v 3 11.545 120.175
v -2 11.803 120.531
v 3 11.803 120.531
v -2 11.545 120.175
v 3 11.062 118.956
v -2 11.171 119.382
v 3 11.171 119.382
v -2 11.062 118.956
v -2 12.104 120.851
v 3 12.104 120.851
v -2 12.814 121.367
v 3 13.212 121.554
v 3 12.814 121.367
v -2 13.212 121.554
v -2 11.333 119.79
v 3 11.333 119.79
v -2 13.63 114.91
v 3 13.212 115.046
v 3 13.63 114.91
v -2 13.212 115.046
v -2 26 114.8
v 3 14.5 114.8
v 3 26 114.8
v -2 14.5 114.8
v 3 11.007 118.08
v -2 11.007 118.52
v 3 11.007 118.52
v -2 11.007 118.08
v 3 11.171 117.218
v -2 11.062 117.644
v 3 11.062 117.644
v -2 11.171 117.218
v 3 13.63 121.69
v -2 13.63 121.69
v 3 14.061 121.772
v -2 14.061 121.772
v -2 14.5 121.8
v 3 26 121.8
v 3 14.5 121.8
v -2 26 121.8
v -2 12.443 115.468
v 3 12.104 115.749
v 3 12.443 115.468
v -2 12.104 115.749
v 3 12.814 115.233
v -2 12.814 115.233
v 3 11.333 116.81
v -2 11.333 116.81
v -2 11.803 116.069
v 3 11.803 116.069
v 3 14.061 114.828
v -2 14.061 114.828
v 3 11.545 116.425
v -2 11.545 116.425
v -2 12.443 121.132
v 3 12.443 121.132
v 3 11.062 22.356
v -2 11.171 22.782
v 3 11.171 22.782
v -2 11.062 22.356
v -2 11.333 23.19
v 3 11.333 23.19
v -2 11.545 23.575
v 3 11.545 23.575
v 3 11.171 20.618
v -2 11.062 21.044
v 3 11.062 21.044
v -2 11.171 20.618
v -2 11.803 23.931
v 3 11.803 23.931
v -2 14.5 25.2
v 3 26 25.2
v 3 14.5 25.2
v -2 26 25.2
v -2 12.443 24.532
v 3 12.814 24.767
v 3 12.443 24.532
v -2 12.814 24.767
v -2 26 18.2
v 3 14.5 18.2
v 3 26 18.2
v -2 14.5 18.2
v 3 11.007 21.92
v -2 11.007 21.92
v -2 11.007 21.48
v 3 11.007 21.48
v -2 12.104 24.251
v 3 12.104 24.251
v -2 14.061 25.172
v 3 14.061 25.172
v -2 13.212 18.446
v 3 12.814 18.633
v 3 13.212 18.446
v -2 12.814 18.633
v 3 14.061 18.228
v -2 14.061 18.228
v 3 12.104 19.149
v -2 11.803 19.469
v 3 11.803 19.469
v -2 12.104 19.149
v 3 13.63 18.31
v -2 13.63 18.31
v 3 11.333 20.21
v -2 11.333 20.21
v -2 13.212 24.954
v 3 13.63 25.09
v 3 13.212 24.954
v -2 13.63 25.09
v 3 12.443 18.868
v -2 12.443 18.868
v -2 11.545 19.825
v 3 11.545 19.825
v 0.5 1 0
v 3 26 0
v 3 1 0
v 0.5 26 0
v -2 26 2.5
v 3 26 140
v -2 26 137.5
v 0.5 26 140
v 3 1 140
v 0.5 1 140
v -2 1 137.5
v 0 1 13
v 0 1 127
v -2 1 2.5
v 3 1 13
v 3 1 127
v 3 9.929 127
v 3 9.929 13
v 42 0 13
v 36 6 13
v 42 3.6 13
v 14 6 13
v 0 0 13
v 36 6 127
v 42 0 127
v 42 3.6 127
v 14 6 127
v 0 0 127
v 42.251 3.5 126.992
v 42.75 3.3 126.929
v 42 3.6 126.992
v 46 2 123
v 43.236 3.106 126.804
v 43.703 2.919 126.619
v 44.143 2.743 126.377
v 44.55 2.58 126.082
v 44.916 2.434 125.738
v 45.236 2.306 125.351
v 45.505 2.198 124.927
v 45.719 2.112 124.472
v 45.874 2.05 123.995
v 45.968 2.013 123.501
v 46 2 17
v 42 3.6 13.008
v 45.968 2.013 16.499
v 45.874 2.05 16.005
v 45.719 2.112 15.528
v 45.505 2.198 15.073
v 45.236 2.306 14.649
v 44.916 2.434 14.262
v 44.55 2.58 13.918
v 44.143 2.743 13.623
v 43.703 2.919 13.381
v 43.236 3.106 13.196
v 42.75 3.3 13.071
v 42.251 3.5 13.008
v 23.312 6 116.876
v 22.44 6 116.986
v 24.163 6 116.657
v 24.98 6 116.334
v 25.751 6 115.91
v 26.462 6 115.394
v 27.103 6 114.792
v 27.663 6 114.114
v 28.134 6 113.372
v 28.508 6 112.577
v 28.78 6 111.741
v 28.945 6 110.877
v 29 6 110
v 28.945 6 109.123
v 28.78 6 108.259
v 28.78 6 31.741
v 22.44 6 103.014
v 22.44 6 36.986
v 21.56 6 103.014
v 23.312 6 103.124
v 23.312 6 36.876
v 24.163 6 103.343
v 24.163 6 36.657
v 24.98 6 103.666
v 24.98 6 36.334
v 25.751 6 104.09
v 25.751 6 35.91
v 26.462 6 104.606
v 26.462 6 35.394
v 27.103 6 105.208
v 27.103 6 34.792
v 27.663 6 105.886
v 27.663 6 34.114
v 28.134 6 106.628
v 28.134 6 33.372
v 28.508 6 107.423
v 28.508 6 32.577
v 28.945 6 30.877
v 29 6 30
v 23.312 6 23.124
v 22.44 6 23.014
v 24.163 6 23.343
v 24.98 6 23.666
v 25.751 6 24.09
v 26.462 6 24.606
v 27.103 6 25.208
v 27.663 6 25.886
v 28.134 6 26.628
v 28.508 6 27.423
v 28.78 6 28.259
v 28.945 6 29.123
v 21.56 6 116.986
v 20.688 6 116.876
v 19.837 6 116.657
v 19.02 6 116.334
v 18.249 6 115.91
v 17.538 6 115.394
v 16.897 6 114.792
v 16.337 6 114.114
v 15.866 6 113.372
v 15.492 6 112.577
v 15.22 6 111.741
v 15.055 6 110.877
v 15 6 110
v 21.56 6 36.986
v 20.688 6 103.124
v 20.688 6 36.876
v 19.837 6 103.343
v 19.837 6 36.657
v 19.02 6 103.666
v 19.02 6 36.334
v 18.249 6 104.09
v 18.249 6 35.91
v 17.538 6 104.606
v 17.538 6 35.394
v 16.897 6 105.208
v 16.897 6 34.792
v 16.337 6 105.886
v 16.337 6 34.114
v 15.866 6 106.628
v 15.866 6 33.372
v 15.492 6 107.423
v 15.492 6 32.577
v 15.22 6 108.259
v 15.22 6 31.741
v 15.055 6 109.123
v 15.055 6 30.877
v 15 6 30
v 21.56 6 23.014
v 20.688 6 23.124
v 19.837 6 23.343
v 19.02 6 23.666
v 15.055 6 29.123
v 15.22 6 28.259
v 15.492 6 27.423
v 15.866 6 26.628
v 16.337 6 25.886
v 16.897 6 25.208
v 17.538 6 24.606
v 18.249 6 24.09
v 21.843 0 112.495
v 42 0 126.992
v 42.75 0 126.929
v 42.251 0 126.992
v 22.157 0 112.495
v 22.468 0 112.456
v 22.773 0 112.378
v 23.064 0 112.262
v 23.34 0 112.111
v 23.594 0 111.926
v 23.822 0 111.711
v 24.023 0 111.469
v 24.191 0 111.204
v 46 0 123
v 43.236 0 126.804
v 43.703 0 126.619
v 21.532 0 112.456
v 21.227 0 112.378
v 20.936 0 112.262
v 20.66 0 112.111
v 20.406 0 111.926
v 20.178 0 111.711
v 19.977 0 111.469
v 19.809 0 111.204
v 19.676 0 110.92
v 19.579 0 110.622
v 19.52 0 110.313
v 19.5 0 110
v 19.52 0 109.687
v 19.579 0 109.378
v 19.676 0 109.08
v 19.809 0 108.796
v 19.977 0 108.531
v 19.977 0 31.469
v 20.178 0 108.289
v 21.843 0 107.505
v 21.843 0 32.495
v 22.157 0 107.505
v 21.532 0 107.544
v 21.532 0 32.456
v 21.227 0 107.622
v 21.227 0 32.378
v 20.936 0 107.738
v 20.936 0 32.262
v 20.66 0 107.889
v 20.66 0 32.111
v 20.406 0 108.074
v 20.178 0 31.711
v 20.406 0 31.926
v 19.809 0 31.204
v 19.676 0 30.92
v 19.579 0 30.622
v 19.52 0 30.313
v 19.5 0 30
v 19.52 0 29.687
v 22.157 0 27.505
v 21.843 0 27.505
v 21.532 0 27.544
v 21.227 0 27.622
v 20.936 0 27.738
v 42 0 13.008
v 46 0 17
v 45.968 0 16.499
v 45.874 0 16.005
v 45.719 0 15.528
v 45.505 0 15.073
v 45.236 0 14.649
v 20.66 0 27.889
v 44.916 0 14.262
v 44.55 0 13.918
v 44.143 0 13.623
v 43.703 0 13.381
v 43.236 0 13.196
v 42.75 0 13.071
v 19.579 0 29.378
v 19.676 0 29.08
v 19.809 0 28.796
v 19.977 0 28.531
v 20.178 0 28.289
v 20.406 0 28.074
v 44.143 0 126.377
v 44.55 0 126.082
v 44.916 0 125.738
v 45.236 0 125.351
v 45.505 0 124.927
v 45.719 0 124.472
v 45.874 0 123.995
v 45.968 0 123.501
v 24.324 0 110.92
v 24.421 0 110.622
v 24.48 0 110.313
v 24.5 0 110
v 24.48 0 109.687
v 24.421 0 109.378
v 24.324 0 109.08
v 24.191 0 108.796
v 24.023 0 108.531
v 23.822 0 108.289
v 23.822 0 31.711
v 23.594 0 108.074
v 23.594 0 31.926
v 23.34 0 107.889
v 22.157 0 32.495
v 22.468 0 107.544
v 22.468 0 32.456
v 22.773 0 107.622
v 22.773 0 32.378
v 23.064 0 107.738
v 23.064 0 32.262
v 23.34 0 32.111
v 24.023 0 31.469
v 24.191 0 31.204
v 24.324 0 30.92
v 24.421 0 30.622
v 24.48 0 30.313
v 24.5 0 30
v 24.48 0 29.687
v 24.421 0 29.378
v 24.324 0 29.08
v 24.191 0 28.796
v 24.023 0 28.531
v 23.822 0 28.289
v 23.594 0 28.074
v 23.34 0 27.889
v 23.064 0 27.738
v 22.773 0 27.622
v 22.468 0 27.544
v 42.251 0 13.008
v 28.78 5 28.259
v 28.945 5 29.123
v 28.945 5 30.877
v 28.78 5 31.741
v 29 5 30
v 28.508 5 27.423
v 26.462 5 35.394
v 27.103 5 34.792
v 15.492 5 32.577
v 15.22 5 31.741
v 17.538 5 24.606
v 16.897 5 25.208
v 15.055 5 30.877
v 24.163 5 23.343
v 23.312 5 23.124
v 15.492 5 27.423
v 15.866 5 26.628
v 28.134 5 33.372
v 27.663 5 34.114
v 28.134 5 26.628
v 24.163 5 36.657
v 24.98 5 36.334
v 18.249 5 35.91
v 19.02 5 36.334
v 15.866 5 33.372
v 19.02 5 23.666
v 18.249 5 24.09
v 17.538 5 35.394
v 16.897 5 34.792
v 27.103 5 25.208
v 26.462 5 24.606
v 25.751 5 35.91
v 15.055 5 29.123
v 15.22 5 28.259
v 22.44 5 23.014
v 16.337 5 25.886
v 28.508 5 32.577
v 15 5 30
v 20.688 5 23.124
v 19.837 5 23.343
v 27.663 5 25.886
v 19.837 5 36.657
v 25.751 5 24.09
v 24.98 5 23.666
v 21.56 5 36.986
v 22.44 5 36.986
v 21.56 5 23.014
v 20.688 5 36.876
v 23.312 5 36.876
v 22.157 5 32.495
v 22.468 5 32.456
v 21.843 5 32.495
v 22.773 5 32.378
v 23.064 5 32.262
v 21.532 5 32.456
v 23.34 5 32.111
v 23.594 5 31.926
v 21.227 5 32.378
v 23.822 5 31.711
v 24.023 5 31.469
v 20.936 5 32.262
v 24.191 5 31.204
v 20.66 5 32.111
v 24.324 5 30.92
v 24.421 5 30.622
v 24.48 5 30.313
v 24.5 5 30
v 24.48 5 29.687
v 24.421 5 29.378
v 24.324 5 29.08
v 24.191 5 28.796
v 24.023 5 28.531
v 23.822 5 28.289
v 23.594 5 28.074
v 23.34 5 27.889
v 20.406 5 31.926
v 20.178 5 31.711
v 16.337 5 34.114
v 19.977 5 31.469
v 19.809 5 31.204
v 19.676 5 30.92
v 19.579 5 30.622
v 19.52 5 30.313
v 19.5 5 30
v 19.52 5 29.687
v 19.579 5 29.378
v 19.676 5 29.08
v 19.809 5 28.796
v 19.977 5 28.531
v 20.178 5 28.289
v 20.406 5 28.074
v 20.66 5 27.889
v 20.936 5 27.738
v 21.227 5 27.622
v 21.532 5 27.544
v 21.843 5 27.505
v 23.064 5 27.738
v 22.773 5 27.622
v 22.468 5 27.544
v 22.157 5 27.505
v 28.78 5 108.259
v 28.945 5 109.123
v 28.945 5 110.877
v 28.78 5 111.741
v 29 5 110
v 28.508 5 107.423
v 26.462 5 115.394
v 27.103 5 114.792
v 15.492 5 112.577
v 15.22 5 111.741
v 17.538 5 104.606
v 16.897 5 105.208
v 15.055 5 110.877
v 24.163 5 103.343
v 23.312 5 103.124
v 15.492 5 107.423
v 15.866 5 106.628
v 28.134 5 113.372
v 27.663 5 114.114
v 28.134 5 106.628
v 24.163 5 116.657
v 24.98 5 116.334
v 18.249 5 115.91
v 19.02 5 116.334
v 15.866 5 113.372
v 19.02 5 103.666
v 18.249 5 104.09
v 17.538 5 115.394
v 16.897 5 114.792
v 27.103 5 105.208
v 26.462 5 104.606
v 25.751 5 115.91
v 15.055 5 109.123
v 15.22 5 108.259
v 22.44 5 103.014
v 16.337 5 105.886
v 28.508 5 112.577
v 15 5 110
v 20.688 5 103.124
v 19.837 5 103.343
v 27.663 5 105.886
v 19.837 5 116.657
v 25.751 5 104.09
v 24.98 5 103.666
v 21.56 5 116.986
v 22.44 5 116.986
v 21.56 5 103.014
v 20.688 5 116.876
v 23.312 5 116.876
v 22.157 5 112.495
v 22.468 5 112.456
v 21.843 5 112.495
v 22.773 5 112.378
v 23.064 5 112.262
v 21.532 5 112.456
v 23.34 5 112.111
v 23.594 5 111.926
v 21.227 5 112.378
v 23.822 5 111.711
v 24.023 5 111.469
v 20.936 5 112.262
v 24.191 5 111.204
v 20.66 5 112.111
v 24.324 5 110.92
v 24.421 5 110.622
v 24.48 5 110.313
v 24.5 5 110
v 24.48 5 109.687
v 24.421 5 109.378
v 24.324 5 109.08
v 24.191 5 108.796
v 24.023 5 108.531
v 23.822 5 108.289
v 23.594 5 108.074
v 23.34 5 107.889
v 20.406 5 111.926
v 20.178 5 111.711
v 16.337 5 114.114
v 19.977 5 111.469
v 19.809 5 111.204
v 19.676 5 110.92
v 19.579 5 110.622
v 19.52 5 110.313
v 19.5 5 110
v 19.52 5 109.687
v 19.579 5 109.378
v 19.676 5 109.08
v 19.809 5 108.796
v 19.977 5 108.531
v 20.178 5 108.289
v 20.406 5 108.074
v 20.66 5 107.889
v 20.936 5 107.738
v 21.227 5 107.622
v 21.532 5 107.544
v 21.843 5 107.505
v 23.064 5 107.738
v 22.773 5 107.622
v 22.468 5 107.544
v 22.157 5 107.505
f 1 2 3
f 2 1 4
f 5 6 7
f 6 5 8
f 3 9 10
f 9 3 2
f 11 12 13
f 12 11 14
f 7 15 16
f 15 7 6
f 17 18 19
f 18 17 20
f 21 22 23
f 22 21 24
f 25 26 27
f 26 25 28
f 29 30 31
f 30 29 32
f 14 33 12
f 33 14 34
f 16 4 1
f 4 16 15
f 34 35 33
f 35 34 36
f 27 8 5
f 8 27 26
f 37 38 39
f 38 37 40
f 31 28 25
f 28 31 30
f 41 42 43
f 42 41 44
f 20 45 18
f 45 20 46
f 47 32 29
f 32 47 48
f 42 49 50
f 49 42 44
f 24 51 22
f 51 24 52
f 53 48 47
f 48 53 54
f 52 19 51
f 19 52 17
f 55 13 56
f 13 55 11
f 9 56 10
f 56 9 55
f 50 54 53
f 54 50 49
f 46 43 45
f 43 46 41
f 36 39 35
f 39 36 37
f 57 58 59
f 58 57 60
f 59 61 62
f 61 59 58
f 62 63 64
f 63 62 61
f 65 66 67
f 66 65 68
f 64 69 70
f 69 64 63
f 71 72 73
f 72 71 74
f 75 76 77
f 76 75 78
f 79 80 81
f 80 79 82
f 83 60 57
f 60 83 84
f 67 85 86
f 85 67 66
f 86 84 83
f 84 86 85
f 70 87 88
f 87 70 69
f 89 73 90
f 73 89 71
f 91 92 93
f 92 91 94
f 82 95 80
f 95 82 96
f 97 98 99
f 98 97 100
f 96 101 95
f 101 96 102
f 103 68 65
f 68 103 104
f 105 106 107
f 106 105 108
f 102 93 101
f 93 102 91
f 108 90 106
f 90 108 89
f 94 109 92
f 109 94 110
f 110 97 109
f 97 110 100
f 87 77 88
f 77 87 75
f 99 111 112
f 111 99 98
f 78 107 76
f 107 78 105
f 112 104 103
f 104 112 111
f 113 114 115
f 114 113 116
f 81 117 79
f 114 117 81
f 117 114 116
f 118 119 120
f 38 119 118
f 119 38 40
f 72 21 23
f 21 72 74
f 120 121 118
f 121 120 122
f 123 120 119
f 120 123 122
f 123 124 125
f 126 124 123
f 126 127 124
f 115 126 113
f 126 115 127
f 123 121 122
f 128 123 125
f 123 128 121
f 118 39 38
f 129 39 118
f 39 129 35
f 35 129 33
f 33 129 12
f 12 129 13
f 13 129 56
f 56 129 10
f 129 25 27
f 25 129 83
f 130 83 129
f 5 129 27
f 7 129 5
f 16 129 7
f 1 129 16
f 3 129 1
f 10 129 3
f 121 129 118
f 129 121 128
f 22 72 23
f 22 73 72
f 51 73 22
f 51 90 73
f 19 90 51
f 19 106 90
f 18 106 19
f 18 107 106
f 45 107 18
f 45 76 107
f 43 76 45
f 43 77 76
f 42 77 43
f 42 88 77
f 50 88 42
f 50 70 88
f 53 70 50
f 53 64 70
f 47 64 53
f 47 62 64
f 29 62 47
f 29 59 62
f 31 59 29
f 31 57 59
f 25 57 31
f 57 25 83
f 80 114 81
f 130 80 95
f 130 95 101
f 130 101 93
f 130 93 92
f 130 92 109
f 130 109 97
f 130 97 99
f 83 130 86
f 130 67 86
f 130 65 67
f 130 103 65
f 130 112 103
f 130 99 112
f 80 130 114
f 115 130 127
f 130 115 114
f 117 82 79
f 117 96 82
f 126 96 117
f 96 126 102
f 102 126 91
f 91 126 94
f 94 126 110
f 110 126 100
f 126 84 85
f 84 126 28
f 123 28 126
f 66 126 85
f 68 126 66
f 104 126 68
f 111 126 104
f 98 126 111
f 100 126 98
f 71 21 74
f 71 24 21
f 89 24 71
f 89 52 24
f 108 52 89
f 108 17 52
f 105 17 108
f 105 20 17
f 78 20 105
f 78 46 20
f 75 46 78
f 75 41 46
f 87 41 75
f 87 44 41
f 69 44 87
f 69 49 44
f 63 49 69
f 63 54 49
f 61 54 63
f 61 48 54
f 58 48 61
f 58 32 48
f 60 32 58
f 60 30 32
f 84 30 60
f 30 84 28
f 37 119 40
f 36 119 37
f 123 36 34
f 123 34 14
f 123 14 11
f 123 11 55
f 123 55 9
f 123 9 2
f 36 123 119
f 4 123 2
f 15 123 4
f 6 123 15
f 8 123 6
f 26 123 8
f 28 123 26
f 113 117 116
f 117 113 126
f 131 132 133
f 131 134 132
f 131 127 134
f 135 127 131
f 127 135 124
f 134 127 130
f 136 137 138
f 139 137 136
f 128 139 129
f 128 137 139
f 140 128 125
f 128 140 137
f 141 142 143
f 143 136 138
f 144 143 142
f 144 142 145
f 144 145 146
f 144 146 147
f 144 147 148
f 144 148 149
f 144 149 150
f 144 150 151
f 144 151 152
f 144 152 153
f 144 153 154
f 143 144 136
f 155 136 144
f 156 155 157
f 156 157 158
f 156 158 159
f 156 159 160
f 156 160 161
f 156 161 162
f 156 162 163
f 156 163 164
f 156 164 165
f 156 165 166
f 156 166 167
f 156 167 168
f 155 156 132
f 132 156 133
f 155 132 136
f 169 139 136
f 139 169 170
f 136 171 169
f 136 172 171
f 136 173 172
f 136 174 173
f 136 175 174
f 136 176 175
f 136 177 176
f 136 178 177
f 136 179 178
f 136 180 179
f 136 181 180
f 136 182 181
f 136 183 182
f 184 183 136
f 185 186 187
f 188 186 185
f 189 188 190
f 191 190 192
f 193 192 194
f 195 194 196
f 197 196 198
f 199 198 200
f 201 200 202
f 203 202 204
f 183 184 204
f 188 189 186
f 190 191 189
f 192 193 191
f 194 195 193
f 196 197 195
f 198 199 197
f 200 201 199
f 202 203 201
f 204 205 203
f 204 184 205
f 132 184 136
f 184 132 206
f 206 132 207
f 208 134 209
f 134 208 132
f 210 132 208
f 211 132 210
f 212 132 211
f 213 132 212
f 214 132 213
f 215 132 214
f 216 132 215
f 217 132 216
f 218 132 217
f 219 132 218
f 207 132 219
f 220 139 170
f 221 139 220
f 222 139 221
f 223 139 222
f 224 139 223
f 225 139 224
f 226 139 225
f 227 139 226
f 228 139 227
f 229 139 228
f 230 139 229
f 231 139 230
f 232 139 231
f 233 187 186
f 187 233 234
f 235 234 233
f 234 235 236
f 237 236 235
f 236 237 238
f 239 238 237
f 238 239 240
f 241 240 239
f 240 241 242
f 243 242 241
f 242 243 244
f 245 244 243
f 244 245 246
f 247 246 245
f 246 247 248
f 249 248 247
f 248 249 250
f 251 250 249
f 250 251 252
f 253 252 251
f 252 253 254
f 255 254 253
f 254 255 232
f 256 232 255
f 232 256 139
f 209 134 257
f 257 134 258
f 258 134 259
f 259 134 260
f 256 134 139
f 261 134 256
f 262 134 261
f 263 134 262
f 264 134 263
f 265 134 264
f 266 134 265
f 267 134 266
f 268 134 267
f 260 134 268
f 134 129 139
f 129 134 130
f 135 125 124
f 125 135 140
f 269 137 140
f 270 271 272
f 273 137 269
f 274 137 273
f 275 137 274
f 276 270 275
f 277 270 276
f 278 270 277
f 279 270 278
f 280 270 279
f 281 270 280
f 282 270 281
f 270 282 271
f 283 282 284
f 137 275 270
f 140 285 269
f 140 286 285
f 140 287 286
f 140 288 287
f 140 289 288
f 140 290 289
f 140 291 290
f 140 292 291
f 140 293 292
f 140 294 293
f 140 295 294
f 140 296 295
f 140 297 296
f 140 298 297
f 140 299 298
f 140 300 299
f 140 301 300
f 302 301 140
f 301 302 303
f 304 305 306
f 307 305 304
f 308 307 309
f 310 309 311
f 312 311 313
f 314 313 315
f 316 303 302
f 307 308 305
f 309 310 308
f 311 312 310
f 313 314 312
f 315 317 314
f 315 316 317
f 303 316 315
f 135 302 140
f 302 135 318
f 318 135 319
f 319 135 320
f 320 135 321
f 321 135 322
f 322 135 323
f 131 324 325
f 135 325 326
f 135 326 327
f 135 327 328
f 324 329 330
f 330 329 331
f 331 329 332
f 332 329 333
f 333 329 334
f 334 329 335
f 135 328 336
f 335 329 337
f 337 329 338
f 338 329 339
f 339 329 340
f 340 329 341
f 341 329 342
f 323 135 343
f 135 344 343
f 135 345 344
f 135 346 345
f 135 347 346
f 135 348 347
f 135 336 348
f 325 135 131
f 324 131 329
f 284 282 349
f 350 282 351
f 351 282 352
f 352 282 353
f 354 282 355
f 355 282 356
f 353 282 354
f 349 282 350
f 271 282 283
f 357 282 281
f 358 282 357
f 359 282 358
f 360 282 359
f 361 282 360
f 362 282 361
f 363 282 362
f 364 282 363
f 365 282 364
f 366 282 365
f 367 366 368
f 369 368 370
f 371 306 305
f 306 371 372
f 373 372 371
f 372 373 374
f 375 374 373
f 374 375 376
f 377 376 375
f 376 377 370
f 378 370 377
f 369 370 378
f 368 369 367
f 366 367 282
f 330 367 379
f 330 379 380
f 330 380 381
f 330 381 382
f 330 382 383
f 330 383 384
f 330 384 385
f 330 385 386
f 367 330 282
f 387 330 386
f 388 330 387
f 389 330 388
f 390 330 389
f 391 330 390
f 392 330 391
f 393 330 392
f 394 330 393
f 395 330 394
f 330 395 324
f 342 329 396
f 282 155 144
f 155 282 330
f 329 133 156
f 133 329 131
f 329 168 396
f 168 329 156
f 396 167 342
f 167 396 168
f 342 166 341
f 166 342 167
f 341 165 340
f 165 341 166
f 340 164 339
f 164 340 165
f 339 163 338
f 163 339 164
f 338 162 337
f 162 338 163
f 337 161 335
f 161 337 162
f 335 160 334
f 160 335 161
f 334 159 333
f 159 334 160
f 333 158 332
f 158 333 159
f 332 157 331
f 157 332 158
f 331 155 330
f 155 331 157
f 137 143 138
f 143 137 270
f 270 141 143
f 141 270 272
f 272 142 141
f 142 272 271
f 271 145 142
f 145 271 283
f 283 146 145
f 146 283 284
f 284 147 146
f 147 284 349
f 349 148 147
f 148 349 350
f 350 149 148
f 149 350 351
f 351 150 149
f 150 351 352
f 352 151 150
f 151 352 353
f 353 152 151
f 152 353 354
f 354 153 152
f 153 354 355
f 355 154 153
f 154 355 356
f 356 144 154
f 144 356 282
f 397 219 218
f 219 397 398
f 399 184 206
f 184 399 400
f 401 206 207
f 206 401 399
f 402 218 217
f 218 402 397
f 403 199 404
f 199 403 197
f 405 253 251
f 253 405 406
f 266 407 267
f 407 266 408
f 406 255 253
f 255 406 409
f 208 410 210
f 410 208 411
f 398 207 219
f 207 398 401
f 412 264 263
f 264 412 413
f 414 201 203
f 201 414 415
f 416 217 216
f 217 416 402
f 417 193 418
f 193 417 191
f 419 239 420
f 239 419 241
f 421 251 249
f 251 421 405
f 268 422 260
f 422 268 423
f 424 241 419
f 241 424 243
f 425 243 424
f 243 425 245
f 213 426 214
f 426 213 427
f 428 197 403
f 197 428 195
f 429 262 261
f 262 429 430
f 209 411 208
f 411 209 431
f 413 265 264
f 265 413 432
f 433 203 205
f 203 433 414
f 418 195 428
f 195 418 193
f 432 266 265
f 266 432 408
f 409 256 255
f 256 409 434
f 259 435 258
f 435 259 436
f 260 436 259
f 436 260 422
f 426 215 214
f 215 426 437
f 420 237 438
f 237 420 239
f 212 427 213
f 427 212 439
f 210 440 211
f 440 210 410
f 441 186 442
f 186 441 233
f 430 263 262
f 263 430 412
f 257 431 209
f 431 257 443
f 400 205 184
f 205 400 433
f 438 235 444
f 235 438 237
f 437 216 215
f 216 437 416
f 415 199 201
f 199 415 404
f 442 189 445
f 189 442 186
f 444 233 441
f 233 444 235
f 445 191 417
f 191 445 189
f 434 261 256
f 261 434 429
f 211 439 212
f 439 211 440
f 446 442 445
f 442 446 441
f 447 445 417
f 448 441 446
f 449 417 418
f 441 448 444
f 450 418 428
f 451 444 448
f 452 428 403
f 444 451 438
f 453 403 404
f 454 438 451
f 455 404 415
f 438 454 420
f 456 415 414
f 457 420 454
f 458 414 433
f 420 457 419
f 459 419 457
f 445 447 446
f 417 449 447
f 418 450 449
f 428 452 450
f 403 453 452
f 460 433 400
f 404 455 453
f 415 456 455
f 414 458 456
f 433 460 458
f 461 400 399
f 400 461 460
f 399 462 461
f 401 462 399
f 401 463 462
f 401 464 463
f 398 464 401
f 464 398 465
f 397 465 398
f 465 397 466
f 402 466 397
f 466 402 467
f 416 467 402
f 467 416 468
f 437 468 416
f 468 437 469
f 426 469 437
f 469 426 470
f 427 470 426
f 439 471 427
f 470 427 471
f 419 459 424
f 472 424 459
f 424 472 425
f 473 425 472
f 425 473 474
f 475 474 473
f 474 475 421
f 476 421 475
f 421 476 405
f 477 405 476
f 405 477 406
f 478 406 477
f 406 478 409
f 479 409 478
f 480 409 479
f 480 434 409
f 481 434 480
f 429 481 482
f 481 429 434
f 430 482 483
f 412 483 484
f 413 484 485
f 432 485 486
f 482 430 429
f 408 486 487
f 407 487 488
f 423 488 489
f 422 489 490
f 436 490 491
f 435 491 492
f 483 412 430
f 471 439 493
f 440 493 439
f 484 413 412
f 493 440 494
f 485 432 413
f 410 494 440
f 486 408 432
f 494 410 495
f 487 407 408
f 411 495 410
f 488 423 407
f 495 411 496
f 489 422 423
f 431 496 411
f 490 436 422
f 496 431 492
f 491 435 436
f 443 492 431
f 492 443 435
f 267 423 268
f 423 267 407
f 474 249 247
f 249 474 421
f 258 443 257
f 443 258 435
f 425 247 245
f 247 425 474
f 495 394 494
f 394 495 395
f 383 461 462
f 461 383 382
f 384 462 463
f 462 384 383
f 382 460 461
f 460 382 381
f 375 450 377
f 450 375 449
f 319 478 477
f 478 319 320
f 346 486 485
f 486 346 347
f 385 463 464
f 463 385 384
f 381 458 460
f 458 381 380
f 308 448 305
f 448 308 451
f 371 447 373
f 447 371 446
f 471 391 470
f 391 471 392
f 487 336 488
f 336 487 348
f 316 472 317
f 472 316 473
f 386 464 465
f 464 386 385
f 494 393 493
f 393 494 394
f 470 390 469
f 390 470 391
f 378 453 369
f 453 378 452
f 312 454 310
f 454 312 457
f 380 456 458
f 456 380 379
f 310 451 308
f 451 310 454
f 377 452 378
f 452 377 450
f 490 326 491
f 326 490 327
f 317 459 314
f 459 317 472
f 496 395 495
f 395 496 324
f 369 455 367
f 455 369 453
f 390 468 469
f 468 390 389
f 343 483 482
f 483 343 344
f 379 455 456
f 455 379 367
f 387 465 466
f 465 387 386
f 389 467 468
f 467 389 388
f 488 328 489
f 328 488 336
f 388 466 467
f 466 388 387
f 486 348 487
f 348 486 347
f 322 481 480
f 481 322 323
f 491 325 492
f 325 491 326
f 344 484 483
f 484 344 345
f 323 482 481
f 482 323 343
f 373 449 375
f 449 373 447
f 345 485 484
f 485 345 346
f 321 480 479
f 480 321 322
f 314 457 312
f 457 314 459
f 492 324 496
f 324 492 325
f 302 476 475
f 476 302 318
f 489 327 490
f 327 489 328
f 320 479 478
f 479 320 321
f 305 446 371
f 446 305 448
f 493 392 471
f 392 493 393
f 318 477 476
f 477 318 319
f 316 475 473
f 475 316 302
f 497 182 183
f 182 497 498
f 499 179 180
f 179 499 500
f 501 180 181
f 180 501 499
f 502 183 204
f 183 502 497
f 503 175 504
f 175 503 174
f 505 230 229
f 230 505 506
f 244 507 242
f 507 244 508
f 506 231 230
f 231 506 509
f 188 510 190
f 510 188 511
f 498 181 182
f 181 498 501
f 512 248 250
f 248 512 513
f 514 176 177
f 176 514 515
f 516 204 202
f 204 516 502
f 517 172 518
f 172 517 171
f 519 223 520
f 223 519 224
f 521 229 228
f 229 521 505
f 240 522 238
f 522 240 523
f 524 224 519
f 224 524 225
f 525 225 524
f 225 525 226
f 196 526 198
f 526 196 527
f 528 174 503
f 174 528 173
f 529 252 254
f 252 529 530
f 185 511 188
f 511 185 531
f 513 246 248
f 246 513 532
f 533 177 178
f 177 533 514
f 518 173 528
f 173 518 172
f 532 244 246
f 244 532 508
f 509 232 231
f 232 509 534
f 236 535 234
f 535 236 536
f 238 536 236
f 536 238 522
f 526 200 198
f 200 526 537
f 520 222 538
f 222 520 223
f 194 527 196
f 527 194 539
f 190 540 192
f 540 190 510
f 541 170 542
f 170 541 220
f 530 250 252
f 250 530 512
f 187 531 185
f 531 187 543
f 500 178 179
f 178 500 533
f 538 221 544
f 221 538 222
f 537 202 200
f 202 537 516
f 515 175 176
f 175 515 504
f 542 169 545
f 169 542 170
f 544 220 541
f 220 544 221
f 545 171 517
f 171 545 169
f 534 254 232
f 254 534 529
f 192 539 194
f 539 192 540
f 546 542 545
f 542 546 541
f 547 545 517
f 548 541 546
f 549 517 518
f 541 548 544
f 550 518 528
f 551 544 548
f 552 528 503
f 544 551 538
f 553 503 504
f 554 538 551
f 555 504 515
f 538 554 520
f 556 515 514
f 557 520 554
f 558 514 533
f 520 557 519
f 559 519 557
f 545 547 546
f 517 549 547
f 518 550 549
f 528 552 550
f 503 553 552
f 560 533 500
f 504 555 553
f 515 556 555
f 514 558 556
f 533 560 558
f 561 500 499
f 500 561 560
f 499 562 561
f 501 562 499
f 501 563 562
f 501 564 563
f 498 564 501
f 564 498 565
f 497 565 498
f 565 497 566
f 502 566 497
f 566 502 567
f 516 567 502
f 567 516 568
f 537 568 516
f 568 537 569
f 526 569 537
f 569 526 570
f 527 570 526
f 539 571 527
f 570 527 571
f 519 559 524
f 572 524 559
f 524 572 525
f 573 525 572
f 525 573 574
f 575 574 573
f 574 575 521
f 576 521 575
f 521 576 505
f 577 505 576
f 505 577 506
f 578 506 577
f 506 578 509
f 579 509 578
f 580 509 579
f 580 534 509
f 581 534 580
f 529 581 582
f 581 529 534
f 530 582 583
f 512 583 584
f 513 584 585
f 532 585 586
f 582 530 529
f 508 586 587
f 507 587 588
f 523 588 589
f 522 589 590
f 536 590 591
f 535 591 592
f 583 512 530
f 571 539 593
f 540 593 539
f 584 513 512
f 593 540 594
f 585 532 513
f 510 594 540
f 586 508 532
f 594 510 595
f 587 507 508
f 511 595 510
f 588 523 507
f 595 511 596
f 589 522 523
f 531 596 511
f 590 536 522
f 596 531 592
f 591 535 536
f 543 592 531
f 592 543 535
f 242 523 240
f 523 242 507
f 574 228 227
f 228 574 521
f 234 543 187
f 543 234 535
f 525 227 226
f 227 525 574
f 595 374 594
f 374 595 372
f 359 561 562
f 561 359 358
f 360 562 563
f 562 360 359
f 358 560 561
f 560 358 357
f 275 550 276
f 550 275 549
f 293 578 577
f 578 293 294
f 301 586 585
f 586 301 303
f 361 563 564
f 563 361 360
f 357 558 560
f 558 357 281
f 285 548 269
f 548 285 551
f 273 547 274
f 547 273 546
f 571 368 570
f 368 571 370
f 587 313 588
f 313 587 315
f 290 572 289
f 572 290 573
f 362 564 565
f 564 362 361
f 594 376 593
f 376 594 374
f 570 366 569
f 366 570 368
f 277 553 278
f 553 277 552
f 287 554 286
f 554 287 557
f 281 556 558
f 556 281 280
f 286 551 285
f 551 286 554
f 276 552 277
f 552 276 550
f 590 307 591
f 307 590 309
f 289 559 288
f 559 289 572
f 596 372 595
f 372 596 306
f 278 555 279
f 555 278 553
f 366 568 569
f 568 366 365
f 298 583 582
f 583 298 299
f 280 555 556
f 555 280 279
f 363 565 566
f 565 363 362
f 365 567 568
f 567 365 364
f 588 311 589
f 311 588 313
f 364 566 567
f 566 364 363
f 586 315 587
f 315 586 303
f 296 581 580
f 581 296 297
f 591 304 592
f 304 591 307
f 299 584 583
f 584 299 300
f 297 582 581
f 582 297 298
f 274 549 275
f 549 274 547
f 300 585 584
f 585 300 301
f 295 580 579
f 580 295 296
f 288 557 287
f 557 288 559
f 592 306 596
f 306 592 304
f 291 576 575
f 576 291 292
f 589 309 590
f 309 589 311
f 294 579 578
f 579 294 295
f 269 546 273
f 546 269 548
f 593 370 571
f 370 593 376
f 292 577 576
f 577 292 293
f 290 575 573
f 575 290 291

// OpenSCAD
/*
 ____                             _     ____ __  __      ____
/ ___|   __ _  _ __   ___  _   _ (_)   / ___|\ \/ /     | ___|
\___ \  / _` || '_ \ / __|| | | || |  | |  _  \  / _____|___ \
 ___) || (_| || | | |\__ \| |_| || |  | |_| | /  \|_____|___) |
|____/  \__,_||_| |_||___/ \__,_||_|   \____|/_/\_\     |____/

Sansui GX-5 rack mounting ear model
Parameterised for use with multiple Sansui components
2021 - Simon Laszcz 

All measurements are in millimetres (mm)

DISCLAIMER
~~~~~~~~~~
- This model has been made public in good faith, but:
- It has NOT been tested with a wide variety of components. It has been shown to work for the SE-9.
- Proportions and relative dimensions were taken from the handles to hand. The intention was to create a functional
rack ear rather than an identical copy. The handle was ommited to reduce 3D printing cost.
- No responsibility will be accepted for printed ears that do not fit the intended component.
- No responsibility will be accepted for printed ears that break or fail to support the intended component.
- You should ensure that parameter measurements are accurate.
- You should visually inspect every aspect of the model before printing.
- Some parameters may be tweaked to reduce printing cost but the resulting strengh of the printed part must be considered.
- You should print cheap prototypes before committing to a more expensive final print.
- The final print should be made using a material strong enough to support the intended component,
e.g. Carbon-fibre Nylon (CF Nylon) or similar.

NOMENCLATURE
~~~~~~~~~~~~
- Ear: A rack mount handle without a handle, i.e. only those parts required to attach a component to a rack.
- Component: e.g. SE-9, AX-7
- Faceplate: Switch and dial mounting plate attached to the front of the case.
- Ear case fixing: That part of the rack ear attached to the component case.
- Ear rack fixing: That part of the rack ear attached to the GX-5 rack.
*/

///////////////
//  PARAMETERS
///////////////

//  Height of the component's faceplate. Defines the size of the ear
case_faceplate_height = 140;
//  The amount the component faceplate overhangs the case on one side
case_faceplate_overhang_x = 1;
//  The amount the component faceplate overhangs the top of the case
case_faceplate_overhang_top = 0;
//  The amount the component faceplate overhangs the bottom of the case
case_faceplate_overhang_bottom = 3;
//  The faceplate on the SE-9 is rolled over the top of the case. When looking side-on, this is the width
//  Use the furl dimensions, along with case_faceplate_overhang_x to dictate the size of the notches printed on the ear case fixing
case_furl_width = 15;
//  The faceplate on the SE-9 is rolled over the top of the case. When looking side-on, this is the height
case_furl_height = 10;
//  Thickness of the component faceplate when looking front-on
case_faceplate_thickness = 2;
//  X distance of the screw hole centre from the front of the case (not including faceplate)
case_screw_x = 22;
//  Y distance of the screw hole centre from the top of the case
case_top_screw_y = 30;
//  Y distance of the screw hole centre from the top of the case
case_bottom_screw_y = 110;
//  Gap between case fixing and top/bottom of case. Can be used to reduce printing cost. Making it too big will reduce strength
case_side_margin = 10;

//////////////////////////////////////
//  COMPUTED/CONSTANTS
//  Probably no need to change these
//////////////////////////////////////

//  CONSTANT. Diameter of screw hole
screw_hole_diameter = 5;
//  CONSTANT. Countersink dimension
screw_hole_countersink_diameter = 14;
//  CONSTANT. Countersink dimension
screw_hole_countersink_depth = 1;
//  COMPUTED. Computed height of the case
case_height = case_faceplate_height - case_faceplate_overhang_top - case_faceplate_overhang_bottom;
//  COMPUTED. Z axis offset of the ear part that fixes to the case. Not including case_side_margin
ear_case_fixing_z_offset = max(case_faceplate_overhang_top, case_faceplate_overhang_bottom);
//  COMPUTED. Initial height of the ear part that fixes to the case. Where top/bottom overhang are unequal, height will be reduced to make the handle symmetrical
ear_case_fixing_height = case_height - ear_case_fixing_z_offset - (case_side_margin * 2);
//  CONSTANT. Width of the ear part that fixes to the case
ear_case_fixing_width = 46;
//  CONSTANT. Depth of the ear part through which the ear is screwed to the case
ear_case_fixing_screw_plate_depth = 6;
//  CONSTANT. Width (front-on) of the ear rack fixing
ear_rack_fixing_width = 25;
//  CONSTANT. Thickness of the ear rack fixing
ear_rack_fixing_thickness = 5;
//  CONSTANT. Radius of corners nearest rear of the case
ear_case_fixing_corner_radius = 4;
//  CONSTANT. Slot dimension
ear_rack_fixing_slot_width = 7;
//  CONSTANT. Slot dimension
ear_rack_fixing_slot_length = 15;
//  CONSTANT. Distance from top/bottom of the rack fixing to the edge of the fixing slot, expressed as a %age of the rack fixing's height
ear_rack_fixing_slot_pc_from_edge = 0.13;
//  CONSTANT. Overall resolution
$fn = 50;

////////////
//  MODEL
////////////

color("yellow") {
    ear_rack_fixing();
    
    difference() {
        ear_case_fixing();              
        ear_case_fixing_screw_masks(); 
        case_furl_notches();
    }
}

module ear_rack_fixing() { 
    chamfer = ear_rack_fixing_thickness / 2;
    dx = ear_rack_fixing_thickness - case_faceplate_thickness;
    dy = case_faceplate_overhang_x;
    dz = case_faceplate_height;
    
    translate([dx, dy, dz])
    rotate([-90, 0, 0])
    rotate([0, 0, 90])
    difference() {
        linear_extrude(ear_rack_fixing_width)
        //  Profile of the longest side. Length depends on faceplate height. Other dimensions are fixed
        polygon([
            [0, 0],
            [case_faceplate_height, 0],
            [case_faceplate_height, chamfer],
            [case_faceplate_height - chamfer, ear_rack_fixing_thickness],
            [chamfer, ear_rack_fixing_thickness],
            [0, chamfer]]);
            
        ear_rack_fixing_slot_masks();
    }
}

module ear_rack_fixing_slot_masks() {
    //  Slot end radius
    rad = ear_rack_fixing_slot_width / 2;
    //  Distance to centre of slot from top/bottom edge
    d = (case_faceplate_height * ear_rack_fixing_slot_pc_from_edge) + rad;   
    //  Gap between slot and edge of rack fixing
    dz = (ear_rack_fixing_width - ear_rack_fixing_slot_length) + rad;
    
    translate([d, -ear_rack_fixing_thickness, dz])
    hull() {    
        //  Make the shape arbitrarily big enough to create the slot without rounding errors
        translate([0, 0, ear_rack_fixing_slot_length * 2]) 
            rotate([-90, 0, 0])
                cylinder(ear_rack_fixing_thickness * 3, rad, rad);
        rotate([-90, 0, 0])
            cylinder(ear_rack_fixing_thickness * 3, rad, rad);
    }
    
    translate([case_faceplate_height - d, -ear_rack_fixing_thickness, dz])
    hull() {    
        //  Make the shape arbitrarily big enough to create the slot without rounding errors
        translate([0, 0, ear_rack_fixing_slot_length * 2]) 
            rotate([-90, 0, 0])
                cylinder(ear_rack_fixing_thickness * 3, rad, rad);
        rotate([-90, 0, 0])
            cylinder(ear_rack_fixing_thickness * 3, rad, rad);
    }    
}

module ear_case_fixing() { 
    dz = ear_case_fixing_z_offset + case_side_margin;
    
    translate([0, 0, dz])
    difference() {
        linear_extrude(ear_case_fixing_height) {
        //  Side-profile. Fixed size independent of case height
        polygon([
            [0, 0],
            [ear_case_fixing_width, 0],
            [ear_case_fixing_width, 2],
            [ear_case_fixing_width - 10, ear_case_fixing_screw_plate_depth],
            [14, ear_case_fixing_screw_plate_depth],
            [0, 11]]);
        }

        //  Top-right rounded corner mask
        //  Add 10 to y to ensure proper clipping
        translate([ear_case_fixing_width - ear_case_fixing_corner_radius, -10, ear_case_fixing_corner_radius])
        rotate([-90, 0, 0])
        linear_extrude(20) 
        difference() {
            //  Square with a quarter circle removed
            square(size = [ear_case_fixing_corner_radius * 2, ear_case_fixing_corner_radius * 2]);
            circle(ear_case_fixing_corner_radius);
        }    
    
        //  Bottom-right rounded corner mask
        translate([ear_case_fixing_width - ear_case_fixing_corner_radius, 10, ear_case_fixing_height - ear_case_fixing_corner_radius])
        rotate([90, 0, 0])
        linear_extrude(20) 
        difference() {
            //  Square with a quarter circle removed
            square(size = [ear_case_fixing_corner_radius * 2, ear_case_fixing_corner_radius * 2]);
            circle(ear_case_fixing_corner_radius);
        }    
    }
}

module ear_case_fixing_screw_masks() {
    screw_hole_radius = screw_hole_diameter / 2;
    screw_hole_countersink_radius = screw_hole_countersink_diameter / 2;

    //  Add 10 to y to ensure proper clipping.
    translate([case_screw_x, ear_case_fixing_screw_plate_depth + 10, case_top_screw_y + case_faceplate_overhang_top])
    rotate([90, 0, 0])
    union() {
        cylinder(screw_hole_countersink_depth + 10, screw_hole_countersink_radius, screw_hole_countersink_radius);
        cylinder(20, screw_hole_radius, screw_hole_radius);
    }
    
    translate([case_screw_x, ear_case_fixing_screw_plate_depth + 10, case_bottom_screw_y + case_faceplate_overhang_top])
    rotate([90, 0, 0])
    union() {
        cylinder(screw_hole_countersink_depth + 10, screw_hole_countersink_radius, screw_hole_countersink_radius);
        cylinder(20, screw_hole_radius, screw_hole_radius);
    }
}

module case_furl_notches() {
    sz_z = case_furl_height + 1;
    translate([-1, -case_faceplate_thickness, -1])
    cube([case_furl_width + 1, case_faceplate_thickness + 1, sz_z]);

    z = case_faceplate_height - sz_z + 1;
    translate([-1, -case_faceplate_thickness, z])
    cube([case_furl_width + 1, case_faceplate_thickness + 1, sz_z]);
}
